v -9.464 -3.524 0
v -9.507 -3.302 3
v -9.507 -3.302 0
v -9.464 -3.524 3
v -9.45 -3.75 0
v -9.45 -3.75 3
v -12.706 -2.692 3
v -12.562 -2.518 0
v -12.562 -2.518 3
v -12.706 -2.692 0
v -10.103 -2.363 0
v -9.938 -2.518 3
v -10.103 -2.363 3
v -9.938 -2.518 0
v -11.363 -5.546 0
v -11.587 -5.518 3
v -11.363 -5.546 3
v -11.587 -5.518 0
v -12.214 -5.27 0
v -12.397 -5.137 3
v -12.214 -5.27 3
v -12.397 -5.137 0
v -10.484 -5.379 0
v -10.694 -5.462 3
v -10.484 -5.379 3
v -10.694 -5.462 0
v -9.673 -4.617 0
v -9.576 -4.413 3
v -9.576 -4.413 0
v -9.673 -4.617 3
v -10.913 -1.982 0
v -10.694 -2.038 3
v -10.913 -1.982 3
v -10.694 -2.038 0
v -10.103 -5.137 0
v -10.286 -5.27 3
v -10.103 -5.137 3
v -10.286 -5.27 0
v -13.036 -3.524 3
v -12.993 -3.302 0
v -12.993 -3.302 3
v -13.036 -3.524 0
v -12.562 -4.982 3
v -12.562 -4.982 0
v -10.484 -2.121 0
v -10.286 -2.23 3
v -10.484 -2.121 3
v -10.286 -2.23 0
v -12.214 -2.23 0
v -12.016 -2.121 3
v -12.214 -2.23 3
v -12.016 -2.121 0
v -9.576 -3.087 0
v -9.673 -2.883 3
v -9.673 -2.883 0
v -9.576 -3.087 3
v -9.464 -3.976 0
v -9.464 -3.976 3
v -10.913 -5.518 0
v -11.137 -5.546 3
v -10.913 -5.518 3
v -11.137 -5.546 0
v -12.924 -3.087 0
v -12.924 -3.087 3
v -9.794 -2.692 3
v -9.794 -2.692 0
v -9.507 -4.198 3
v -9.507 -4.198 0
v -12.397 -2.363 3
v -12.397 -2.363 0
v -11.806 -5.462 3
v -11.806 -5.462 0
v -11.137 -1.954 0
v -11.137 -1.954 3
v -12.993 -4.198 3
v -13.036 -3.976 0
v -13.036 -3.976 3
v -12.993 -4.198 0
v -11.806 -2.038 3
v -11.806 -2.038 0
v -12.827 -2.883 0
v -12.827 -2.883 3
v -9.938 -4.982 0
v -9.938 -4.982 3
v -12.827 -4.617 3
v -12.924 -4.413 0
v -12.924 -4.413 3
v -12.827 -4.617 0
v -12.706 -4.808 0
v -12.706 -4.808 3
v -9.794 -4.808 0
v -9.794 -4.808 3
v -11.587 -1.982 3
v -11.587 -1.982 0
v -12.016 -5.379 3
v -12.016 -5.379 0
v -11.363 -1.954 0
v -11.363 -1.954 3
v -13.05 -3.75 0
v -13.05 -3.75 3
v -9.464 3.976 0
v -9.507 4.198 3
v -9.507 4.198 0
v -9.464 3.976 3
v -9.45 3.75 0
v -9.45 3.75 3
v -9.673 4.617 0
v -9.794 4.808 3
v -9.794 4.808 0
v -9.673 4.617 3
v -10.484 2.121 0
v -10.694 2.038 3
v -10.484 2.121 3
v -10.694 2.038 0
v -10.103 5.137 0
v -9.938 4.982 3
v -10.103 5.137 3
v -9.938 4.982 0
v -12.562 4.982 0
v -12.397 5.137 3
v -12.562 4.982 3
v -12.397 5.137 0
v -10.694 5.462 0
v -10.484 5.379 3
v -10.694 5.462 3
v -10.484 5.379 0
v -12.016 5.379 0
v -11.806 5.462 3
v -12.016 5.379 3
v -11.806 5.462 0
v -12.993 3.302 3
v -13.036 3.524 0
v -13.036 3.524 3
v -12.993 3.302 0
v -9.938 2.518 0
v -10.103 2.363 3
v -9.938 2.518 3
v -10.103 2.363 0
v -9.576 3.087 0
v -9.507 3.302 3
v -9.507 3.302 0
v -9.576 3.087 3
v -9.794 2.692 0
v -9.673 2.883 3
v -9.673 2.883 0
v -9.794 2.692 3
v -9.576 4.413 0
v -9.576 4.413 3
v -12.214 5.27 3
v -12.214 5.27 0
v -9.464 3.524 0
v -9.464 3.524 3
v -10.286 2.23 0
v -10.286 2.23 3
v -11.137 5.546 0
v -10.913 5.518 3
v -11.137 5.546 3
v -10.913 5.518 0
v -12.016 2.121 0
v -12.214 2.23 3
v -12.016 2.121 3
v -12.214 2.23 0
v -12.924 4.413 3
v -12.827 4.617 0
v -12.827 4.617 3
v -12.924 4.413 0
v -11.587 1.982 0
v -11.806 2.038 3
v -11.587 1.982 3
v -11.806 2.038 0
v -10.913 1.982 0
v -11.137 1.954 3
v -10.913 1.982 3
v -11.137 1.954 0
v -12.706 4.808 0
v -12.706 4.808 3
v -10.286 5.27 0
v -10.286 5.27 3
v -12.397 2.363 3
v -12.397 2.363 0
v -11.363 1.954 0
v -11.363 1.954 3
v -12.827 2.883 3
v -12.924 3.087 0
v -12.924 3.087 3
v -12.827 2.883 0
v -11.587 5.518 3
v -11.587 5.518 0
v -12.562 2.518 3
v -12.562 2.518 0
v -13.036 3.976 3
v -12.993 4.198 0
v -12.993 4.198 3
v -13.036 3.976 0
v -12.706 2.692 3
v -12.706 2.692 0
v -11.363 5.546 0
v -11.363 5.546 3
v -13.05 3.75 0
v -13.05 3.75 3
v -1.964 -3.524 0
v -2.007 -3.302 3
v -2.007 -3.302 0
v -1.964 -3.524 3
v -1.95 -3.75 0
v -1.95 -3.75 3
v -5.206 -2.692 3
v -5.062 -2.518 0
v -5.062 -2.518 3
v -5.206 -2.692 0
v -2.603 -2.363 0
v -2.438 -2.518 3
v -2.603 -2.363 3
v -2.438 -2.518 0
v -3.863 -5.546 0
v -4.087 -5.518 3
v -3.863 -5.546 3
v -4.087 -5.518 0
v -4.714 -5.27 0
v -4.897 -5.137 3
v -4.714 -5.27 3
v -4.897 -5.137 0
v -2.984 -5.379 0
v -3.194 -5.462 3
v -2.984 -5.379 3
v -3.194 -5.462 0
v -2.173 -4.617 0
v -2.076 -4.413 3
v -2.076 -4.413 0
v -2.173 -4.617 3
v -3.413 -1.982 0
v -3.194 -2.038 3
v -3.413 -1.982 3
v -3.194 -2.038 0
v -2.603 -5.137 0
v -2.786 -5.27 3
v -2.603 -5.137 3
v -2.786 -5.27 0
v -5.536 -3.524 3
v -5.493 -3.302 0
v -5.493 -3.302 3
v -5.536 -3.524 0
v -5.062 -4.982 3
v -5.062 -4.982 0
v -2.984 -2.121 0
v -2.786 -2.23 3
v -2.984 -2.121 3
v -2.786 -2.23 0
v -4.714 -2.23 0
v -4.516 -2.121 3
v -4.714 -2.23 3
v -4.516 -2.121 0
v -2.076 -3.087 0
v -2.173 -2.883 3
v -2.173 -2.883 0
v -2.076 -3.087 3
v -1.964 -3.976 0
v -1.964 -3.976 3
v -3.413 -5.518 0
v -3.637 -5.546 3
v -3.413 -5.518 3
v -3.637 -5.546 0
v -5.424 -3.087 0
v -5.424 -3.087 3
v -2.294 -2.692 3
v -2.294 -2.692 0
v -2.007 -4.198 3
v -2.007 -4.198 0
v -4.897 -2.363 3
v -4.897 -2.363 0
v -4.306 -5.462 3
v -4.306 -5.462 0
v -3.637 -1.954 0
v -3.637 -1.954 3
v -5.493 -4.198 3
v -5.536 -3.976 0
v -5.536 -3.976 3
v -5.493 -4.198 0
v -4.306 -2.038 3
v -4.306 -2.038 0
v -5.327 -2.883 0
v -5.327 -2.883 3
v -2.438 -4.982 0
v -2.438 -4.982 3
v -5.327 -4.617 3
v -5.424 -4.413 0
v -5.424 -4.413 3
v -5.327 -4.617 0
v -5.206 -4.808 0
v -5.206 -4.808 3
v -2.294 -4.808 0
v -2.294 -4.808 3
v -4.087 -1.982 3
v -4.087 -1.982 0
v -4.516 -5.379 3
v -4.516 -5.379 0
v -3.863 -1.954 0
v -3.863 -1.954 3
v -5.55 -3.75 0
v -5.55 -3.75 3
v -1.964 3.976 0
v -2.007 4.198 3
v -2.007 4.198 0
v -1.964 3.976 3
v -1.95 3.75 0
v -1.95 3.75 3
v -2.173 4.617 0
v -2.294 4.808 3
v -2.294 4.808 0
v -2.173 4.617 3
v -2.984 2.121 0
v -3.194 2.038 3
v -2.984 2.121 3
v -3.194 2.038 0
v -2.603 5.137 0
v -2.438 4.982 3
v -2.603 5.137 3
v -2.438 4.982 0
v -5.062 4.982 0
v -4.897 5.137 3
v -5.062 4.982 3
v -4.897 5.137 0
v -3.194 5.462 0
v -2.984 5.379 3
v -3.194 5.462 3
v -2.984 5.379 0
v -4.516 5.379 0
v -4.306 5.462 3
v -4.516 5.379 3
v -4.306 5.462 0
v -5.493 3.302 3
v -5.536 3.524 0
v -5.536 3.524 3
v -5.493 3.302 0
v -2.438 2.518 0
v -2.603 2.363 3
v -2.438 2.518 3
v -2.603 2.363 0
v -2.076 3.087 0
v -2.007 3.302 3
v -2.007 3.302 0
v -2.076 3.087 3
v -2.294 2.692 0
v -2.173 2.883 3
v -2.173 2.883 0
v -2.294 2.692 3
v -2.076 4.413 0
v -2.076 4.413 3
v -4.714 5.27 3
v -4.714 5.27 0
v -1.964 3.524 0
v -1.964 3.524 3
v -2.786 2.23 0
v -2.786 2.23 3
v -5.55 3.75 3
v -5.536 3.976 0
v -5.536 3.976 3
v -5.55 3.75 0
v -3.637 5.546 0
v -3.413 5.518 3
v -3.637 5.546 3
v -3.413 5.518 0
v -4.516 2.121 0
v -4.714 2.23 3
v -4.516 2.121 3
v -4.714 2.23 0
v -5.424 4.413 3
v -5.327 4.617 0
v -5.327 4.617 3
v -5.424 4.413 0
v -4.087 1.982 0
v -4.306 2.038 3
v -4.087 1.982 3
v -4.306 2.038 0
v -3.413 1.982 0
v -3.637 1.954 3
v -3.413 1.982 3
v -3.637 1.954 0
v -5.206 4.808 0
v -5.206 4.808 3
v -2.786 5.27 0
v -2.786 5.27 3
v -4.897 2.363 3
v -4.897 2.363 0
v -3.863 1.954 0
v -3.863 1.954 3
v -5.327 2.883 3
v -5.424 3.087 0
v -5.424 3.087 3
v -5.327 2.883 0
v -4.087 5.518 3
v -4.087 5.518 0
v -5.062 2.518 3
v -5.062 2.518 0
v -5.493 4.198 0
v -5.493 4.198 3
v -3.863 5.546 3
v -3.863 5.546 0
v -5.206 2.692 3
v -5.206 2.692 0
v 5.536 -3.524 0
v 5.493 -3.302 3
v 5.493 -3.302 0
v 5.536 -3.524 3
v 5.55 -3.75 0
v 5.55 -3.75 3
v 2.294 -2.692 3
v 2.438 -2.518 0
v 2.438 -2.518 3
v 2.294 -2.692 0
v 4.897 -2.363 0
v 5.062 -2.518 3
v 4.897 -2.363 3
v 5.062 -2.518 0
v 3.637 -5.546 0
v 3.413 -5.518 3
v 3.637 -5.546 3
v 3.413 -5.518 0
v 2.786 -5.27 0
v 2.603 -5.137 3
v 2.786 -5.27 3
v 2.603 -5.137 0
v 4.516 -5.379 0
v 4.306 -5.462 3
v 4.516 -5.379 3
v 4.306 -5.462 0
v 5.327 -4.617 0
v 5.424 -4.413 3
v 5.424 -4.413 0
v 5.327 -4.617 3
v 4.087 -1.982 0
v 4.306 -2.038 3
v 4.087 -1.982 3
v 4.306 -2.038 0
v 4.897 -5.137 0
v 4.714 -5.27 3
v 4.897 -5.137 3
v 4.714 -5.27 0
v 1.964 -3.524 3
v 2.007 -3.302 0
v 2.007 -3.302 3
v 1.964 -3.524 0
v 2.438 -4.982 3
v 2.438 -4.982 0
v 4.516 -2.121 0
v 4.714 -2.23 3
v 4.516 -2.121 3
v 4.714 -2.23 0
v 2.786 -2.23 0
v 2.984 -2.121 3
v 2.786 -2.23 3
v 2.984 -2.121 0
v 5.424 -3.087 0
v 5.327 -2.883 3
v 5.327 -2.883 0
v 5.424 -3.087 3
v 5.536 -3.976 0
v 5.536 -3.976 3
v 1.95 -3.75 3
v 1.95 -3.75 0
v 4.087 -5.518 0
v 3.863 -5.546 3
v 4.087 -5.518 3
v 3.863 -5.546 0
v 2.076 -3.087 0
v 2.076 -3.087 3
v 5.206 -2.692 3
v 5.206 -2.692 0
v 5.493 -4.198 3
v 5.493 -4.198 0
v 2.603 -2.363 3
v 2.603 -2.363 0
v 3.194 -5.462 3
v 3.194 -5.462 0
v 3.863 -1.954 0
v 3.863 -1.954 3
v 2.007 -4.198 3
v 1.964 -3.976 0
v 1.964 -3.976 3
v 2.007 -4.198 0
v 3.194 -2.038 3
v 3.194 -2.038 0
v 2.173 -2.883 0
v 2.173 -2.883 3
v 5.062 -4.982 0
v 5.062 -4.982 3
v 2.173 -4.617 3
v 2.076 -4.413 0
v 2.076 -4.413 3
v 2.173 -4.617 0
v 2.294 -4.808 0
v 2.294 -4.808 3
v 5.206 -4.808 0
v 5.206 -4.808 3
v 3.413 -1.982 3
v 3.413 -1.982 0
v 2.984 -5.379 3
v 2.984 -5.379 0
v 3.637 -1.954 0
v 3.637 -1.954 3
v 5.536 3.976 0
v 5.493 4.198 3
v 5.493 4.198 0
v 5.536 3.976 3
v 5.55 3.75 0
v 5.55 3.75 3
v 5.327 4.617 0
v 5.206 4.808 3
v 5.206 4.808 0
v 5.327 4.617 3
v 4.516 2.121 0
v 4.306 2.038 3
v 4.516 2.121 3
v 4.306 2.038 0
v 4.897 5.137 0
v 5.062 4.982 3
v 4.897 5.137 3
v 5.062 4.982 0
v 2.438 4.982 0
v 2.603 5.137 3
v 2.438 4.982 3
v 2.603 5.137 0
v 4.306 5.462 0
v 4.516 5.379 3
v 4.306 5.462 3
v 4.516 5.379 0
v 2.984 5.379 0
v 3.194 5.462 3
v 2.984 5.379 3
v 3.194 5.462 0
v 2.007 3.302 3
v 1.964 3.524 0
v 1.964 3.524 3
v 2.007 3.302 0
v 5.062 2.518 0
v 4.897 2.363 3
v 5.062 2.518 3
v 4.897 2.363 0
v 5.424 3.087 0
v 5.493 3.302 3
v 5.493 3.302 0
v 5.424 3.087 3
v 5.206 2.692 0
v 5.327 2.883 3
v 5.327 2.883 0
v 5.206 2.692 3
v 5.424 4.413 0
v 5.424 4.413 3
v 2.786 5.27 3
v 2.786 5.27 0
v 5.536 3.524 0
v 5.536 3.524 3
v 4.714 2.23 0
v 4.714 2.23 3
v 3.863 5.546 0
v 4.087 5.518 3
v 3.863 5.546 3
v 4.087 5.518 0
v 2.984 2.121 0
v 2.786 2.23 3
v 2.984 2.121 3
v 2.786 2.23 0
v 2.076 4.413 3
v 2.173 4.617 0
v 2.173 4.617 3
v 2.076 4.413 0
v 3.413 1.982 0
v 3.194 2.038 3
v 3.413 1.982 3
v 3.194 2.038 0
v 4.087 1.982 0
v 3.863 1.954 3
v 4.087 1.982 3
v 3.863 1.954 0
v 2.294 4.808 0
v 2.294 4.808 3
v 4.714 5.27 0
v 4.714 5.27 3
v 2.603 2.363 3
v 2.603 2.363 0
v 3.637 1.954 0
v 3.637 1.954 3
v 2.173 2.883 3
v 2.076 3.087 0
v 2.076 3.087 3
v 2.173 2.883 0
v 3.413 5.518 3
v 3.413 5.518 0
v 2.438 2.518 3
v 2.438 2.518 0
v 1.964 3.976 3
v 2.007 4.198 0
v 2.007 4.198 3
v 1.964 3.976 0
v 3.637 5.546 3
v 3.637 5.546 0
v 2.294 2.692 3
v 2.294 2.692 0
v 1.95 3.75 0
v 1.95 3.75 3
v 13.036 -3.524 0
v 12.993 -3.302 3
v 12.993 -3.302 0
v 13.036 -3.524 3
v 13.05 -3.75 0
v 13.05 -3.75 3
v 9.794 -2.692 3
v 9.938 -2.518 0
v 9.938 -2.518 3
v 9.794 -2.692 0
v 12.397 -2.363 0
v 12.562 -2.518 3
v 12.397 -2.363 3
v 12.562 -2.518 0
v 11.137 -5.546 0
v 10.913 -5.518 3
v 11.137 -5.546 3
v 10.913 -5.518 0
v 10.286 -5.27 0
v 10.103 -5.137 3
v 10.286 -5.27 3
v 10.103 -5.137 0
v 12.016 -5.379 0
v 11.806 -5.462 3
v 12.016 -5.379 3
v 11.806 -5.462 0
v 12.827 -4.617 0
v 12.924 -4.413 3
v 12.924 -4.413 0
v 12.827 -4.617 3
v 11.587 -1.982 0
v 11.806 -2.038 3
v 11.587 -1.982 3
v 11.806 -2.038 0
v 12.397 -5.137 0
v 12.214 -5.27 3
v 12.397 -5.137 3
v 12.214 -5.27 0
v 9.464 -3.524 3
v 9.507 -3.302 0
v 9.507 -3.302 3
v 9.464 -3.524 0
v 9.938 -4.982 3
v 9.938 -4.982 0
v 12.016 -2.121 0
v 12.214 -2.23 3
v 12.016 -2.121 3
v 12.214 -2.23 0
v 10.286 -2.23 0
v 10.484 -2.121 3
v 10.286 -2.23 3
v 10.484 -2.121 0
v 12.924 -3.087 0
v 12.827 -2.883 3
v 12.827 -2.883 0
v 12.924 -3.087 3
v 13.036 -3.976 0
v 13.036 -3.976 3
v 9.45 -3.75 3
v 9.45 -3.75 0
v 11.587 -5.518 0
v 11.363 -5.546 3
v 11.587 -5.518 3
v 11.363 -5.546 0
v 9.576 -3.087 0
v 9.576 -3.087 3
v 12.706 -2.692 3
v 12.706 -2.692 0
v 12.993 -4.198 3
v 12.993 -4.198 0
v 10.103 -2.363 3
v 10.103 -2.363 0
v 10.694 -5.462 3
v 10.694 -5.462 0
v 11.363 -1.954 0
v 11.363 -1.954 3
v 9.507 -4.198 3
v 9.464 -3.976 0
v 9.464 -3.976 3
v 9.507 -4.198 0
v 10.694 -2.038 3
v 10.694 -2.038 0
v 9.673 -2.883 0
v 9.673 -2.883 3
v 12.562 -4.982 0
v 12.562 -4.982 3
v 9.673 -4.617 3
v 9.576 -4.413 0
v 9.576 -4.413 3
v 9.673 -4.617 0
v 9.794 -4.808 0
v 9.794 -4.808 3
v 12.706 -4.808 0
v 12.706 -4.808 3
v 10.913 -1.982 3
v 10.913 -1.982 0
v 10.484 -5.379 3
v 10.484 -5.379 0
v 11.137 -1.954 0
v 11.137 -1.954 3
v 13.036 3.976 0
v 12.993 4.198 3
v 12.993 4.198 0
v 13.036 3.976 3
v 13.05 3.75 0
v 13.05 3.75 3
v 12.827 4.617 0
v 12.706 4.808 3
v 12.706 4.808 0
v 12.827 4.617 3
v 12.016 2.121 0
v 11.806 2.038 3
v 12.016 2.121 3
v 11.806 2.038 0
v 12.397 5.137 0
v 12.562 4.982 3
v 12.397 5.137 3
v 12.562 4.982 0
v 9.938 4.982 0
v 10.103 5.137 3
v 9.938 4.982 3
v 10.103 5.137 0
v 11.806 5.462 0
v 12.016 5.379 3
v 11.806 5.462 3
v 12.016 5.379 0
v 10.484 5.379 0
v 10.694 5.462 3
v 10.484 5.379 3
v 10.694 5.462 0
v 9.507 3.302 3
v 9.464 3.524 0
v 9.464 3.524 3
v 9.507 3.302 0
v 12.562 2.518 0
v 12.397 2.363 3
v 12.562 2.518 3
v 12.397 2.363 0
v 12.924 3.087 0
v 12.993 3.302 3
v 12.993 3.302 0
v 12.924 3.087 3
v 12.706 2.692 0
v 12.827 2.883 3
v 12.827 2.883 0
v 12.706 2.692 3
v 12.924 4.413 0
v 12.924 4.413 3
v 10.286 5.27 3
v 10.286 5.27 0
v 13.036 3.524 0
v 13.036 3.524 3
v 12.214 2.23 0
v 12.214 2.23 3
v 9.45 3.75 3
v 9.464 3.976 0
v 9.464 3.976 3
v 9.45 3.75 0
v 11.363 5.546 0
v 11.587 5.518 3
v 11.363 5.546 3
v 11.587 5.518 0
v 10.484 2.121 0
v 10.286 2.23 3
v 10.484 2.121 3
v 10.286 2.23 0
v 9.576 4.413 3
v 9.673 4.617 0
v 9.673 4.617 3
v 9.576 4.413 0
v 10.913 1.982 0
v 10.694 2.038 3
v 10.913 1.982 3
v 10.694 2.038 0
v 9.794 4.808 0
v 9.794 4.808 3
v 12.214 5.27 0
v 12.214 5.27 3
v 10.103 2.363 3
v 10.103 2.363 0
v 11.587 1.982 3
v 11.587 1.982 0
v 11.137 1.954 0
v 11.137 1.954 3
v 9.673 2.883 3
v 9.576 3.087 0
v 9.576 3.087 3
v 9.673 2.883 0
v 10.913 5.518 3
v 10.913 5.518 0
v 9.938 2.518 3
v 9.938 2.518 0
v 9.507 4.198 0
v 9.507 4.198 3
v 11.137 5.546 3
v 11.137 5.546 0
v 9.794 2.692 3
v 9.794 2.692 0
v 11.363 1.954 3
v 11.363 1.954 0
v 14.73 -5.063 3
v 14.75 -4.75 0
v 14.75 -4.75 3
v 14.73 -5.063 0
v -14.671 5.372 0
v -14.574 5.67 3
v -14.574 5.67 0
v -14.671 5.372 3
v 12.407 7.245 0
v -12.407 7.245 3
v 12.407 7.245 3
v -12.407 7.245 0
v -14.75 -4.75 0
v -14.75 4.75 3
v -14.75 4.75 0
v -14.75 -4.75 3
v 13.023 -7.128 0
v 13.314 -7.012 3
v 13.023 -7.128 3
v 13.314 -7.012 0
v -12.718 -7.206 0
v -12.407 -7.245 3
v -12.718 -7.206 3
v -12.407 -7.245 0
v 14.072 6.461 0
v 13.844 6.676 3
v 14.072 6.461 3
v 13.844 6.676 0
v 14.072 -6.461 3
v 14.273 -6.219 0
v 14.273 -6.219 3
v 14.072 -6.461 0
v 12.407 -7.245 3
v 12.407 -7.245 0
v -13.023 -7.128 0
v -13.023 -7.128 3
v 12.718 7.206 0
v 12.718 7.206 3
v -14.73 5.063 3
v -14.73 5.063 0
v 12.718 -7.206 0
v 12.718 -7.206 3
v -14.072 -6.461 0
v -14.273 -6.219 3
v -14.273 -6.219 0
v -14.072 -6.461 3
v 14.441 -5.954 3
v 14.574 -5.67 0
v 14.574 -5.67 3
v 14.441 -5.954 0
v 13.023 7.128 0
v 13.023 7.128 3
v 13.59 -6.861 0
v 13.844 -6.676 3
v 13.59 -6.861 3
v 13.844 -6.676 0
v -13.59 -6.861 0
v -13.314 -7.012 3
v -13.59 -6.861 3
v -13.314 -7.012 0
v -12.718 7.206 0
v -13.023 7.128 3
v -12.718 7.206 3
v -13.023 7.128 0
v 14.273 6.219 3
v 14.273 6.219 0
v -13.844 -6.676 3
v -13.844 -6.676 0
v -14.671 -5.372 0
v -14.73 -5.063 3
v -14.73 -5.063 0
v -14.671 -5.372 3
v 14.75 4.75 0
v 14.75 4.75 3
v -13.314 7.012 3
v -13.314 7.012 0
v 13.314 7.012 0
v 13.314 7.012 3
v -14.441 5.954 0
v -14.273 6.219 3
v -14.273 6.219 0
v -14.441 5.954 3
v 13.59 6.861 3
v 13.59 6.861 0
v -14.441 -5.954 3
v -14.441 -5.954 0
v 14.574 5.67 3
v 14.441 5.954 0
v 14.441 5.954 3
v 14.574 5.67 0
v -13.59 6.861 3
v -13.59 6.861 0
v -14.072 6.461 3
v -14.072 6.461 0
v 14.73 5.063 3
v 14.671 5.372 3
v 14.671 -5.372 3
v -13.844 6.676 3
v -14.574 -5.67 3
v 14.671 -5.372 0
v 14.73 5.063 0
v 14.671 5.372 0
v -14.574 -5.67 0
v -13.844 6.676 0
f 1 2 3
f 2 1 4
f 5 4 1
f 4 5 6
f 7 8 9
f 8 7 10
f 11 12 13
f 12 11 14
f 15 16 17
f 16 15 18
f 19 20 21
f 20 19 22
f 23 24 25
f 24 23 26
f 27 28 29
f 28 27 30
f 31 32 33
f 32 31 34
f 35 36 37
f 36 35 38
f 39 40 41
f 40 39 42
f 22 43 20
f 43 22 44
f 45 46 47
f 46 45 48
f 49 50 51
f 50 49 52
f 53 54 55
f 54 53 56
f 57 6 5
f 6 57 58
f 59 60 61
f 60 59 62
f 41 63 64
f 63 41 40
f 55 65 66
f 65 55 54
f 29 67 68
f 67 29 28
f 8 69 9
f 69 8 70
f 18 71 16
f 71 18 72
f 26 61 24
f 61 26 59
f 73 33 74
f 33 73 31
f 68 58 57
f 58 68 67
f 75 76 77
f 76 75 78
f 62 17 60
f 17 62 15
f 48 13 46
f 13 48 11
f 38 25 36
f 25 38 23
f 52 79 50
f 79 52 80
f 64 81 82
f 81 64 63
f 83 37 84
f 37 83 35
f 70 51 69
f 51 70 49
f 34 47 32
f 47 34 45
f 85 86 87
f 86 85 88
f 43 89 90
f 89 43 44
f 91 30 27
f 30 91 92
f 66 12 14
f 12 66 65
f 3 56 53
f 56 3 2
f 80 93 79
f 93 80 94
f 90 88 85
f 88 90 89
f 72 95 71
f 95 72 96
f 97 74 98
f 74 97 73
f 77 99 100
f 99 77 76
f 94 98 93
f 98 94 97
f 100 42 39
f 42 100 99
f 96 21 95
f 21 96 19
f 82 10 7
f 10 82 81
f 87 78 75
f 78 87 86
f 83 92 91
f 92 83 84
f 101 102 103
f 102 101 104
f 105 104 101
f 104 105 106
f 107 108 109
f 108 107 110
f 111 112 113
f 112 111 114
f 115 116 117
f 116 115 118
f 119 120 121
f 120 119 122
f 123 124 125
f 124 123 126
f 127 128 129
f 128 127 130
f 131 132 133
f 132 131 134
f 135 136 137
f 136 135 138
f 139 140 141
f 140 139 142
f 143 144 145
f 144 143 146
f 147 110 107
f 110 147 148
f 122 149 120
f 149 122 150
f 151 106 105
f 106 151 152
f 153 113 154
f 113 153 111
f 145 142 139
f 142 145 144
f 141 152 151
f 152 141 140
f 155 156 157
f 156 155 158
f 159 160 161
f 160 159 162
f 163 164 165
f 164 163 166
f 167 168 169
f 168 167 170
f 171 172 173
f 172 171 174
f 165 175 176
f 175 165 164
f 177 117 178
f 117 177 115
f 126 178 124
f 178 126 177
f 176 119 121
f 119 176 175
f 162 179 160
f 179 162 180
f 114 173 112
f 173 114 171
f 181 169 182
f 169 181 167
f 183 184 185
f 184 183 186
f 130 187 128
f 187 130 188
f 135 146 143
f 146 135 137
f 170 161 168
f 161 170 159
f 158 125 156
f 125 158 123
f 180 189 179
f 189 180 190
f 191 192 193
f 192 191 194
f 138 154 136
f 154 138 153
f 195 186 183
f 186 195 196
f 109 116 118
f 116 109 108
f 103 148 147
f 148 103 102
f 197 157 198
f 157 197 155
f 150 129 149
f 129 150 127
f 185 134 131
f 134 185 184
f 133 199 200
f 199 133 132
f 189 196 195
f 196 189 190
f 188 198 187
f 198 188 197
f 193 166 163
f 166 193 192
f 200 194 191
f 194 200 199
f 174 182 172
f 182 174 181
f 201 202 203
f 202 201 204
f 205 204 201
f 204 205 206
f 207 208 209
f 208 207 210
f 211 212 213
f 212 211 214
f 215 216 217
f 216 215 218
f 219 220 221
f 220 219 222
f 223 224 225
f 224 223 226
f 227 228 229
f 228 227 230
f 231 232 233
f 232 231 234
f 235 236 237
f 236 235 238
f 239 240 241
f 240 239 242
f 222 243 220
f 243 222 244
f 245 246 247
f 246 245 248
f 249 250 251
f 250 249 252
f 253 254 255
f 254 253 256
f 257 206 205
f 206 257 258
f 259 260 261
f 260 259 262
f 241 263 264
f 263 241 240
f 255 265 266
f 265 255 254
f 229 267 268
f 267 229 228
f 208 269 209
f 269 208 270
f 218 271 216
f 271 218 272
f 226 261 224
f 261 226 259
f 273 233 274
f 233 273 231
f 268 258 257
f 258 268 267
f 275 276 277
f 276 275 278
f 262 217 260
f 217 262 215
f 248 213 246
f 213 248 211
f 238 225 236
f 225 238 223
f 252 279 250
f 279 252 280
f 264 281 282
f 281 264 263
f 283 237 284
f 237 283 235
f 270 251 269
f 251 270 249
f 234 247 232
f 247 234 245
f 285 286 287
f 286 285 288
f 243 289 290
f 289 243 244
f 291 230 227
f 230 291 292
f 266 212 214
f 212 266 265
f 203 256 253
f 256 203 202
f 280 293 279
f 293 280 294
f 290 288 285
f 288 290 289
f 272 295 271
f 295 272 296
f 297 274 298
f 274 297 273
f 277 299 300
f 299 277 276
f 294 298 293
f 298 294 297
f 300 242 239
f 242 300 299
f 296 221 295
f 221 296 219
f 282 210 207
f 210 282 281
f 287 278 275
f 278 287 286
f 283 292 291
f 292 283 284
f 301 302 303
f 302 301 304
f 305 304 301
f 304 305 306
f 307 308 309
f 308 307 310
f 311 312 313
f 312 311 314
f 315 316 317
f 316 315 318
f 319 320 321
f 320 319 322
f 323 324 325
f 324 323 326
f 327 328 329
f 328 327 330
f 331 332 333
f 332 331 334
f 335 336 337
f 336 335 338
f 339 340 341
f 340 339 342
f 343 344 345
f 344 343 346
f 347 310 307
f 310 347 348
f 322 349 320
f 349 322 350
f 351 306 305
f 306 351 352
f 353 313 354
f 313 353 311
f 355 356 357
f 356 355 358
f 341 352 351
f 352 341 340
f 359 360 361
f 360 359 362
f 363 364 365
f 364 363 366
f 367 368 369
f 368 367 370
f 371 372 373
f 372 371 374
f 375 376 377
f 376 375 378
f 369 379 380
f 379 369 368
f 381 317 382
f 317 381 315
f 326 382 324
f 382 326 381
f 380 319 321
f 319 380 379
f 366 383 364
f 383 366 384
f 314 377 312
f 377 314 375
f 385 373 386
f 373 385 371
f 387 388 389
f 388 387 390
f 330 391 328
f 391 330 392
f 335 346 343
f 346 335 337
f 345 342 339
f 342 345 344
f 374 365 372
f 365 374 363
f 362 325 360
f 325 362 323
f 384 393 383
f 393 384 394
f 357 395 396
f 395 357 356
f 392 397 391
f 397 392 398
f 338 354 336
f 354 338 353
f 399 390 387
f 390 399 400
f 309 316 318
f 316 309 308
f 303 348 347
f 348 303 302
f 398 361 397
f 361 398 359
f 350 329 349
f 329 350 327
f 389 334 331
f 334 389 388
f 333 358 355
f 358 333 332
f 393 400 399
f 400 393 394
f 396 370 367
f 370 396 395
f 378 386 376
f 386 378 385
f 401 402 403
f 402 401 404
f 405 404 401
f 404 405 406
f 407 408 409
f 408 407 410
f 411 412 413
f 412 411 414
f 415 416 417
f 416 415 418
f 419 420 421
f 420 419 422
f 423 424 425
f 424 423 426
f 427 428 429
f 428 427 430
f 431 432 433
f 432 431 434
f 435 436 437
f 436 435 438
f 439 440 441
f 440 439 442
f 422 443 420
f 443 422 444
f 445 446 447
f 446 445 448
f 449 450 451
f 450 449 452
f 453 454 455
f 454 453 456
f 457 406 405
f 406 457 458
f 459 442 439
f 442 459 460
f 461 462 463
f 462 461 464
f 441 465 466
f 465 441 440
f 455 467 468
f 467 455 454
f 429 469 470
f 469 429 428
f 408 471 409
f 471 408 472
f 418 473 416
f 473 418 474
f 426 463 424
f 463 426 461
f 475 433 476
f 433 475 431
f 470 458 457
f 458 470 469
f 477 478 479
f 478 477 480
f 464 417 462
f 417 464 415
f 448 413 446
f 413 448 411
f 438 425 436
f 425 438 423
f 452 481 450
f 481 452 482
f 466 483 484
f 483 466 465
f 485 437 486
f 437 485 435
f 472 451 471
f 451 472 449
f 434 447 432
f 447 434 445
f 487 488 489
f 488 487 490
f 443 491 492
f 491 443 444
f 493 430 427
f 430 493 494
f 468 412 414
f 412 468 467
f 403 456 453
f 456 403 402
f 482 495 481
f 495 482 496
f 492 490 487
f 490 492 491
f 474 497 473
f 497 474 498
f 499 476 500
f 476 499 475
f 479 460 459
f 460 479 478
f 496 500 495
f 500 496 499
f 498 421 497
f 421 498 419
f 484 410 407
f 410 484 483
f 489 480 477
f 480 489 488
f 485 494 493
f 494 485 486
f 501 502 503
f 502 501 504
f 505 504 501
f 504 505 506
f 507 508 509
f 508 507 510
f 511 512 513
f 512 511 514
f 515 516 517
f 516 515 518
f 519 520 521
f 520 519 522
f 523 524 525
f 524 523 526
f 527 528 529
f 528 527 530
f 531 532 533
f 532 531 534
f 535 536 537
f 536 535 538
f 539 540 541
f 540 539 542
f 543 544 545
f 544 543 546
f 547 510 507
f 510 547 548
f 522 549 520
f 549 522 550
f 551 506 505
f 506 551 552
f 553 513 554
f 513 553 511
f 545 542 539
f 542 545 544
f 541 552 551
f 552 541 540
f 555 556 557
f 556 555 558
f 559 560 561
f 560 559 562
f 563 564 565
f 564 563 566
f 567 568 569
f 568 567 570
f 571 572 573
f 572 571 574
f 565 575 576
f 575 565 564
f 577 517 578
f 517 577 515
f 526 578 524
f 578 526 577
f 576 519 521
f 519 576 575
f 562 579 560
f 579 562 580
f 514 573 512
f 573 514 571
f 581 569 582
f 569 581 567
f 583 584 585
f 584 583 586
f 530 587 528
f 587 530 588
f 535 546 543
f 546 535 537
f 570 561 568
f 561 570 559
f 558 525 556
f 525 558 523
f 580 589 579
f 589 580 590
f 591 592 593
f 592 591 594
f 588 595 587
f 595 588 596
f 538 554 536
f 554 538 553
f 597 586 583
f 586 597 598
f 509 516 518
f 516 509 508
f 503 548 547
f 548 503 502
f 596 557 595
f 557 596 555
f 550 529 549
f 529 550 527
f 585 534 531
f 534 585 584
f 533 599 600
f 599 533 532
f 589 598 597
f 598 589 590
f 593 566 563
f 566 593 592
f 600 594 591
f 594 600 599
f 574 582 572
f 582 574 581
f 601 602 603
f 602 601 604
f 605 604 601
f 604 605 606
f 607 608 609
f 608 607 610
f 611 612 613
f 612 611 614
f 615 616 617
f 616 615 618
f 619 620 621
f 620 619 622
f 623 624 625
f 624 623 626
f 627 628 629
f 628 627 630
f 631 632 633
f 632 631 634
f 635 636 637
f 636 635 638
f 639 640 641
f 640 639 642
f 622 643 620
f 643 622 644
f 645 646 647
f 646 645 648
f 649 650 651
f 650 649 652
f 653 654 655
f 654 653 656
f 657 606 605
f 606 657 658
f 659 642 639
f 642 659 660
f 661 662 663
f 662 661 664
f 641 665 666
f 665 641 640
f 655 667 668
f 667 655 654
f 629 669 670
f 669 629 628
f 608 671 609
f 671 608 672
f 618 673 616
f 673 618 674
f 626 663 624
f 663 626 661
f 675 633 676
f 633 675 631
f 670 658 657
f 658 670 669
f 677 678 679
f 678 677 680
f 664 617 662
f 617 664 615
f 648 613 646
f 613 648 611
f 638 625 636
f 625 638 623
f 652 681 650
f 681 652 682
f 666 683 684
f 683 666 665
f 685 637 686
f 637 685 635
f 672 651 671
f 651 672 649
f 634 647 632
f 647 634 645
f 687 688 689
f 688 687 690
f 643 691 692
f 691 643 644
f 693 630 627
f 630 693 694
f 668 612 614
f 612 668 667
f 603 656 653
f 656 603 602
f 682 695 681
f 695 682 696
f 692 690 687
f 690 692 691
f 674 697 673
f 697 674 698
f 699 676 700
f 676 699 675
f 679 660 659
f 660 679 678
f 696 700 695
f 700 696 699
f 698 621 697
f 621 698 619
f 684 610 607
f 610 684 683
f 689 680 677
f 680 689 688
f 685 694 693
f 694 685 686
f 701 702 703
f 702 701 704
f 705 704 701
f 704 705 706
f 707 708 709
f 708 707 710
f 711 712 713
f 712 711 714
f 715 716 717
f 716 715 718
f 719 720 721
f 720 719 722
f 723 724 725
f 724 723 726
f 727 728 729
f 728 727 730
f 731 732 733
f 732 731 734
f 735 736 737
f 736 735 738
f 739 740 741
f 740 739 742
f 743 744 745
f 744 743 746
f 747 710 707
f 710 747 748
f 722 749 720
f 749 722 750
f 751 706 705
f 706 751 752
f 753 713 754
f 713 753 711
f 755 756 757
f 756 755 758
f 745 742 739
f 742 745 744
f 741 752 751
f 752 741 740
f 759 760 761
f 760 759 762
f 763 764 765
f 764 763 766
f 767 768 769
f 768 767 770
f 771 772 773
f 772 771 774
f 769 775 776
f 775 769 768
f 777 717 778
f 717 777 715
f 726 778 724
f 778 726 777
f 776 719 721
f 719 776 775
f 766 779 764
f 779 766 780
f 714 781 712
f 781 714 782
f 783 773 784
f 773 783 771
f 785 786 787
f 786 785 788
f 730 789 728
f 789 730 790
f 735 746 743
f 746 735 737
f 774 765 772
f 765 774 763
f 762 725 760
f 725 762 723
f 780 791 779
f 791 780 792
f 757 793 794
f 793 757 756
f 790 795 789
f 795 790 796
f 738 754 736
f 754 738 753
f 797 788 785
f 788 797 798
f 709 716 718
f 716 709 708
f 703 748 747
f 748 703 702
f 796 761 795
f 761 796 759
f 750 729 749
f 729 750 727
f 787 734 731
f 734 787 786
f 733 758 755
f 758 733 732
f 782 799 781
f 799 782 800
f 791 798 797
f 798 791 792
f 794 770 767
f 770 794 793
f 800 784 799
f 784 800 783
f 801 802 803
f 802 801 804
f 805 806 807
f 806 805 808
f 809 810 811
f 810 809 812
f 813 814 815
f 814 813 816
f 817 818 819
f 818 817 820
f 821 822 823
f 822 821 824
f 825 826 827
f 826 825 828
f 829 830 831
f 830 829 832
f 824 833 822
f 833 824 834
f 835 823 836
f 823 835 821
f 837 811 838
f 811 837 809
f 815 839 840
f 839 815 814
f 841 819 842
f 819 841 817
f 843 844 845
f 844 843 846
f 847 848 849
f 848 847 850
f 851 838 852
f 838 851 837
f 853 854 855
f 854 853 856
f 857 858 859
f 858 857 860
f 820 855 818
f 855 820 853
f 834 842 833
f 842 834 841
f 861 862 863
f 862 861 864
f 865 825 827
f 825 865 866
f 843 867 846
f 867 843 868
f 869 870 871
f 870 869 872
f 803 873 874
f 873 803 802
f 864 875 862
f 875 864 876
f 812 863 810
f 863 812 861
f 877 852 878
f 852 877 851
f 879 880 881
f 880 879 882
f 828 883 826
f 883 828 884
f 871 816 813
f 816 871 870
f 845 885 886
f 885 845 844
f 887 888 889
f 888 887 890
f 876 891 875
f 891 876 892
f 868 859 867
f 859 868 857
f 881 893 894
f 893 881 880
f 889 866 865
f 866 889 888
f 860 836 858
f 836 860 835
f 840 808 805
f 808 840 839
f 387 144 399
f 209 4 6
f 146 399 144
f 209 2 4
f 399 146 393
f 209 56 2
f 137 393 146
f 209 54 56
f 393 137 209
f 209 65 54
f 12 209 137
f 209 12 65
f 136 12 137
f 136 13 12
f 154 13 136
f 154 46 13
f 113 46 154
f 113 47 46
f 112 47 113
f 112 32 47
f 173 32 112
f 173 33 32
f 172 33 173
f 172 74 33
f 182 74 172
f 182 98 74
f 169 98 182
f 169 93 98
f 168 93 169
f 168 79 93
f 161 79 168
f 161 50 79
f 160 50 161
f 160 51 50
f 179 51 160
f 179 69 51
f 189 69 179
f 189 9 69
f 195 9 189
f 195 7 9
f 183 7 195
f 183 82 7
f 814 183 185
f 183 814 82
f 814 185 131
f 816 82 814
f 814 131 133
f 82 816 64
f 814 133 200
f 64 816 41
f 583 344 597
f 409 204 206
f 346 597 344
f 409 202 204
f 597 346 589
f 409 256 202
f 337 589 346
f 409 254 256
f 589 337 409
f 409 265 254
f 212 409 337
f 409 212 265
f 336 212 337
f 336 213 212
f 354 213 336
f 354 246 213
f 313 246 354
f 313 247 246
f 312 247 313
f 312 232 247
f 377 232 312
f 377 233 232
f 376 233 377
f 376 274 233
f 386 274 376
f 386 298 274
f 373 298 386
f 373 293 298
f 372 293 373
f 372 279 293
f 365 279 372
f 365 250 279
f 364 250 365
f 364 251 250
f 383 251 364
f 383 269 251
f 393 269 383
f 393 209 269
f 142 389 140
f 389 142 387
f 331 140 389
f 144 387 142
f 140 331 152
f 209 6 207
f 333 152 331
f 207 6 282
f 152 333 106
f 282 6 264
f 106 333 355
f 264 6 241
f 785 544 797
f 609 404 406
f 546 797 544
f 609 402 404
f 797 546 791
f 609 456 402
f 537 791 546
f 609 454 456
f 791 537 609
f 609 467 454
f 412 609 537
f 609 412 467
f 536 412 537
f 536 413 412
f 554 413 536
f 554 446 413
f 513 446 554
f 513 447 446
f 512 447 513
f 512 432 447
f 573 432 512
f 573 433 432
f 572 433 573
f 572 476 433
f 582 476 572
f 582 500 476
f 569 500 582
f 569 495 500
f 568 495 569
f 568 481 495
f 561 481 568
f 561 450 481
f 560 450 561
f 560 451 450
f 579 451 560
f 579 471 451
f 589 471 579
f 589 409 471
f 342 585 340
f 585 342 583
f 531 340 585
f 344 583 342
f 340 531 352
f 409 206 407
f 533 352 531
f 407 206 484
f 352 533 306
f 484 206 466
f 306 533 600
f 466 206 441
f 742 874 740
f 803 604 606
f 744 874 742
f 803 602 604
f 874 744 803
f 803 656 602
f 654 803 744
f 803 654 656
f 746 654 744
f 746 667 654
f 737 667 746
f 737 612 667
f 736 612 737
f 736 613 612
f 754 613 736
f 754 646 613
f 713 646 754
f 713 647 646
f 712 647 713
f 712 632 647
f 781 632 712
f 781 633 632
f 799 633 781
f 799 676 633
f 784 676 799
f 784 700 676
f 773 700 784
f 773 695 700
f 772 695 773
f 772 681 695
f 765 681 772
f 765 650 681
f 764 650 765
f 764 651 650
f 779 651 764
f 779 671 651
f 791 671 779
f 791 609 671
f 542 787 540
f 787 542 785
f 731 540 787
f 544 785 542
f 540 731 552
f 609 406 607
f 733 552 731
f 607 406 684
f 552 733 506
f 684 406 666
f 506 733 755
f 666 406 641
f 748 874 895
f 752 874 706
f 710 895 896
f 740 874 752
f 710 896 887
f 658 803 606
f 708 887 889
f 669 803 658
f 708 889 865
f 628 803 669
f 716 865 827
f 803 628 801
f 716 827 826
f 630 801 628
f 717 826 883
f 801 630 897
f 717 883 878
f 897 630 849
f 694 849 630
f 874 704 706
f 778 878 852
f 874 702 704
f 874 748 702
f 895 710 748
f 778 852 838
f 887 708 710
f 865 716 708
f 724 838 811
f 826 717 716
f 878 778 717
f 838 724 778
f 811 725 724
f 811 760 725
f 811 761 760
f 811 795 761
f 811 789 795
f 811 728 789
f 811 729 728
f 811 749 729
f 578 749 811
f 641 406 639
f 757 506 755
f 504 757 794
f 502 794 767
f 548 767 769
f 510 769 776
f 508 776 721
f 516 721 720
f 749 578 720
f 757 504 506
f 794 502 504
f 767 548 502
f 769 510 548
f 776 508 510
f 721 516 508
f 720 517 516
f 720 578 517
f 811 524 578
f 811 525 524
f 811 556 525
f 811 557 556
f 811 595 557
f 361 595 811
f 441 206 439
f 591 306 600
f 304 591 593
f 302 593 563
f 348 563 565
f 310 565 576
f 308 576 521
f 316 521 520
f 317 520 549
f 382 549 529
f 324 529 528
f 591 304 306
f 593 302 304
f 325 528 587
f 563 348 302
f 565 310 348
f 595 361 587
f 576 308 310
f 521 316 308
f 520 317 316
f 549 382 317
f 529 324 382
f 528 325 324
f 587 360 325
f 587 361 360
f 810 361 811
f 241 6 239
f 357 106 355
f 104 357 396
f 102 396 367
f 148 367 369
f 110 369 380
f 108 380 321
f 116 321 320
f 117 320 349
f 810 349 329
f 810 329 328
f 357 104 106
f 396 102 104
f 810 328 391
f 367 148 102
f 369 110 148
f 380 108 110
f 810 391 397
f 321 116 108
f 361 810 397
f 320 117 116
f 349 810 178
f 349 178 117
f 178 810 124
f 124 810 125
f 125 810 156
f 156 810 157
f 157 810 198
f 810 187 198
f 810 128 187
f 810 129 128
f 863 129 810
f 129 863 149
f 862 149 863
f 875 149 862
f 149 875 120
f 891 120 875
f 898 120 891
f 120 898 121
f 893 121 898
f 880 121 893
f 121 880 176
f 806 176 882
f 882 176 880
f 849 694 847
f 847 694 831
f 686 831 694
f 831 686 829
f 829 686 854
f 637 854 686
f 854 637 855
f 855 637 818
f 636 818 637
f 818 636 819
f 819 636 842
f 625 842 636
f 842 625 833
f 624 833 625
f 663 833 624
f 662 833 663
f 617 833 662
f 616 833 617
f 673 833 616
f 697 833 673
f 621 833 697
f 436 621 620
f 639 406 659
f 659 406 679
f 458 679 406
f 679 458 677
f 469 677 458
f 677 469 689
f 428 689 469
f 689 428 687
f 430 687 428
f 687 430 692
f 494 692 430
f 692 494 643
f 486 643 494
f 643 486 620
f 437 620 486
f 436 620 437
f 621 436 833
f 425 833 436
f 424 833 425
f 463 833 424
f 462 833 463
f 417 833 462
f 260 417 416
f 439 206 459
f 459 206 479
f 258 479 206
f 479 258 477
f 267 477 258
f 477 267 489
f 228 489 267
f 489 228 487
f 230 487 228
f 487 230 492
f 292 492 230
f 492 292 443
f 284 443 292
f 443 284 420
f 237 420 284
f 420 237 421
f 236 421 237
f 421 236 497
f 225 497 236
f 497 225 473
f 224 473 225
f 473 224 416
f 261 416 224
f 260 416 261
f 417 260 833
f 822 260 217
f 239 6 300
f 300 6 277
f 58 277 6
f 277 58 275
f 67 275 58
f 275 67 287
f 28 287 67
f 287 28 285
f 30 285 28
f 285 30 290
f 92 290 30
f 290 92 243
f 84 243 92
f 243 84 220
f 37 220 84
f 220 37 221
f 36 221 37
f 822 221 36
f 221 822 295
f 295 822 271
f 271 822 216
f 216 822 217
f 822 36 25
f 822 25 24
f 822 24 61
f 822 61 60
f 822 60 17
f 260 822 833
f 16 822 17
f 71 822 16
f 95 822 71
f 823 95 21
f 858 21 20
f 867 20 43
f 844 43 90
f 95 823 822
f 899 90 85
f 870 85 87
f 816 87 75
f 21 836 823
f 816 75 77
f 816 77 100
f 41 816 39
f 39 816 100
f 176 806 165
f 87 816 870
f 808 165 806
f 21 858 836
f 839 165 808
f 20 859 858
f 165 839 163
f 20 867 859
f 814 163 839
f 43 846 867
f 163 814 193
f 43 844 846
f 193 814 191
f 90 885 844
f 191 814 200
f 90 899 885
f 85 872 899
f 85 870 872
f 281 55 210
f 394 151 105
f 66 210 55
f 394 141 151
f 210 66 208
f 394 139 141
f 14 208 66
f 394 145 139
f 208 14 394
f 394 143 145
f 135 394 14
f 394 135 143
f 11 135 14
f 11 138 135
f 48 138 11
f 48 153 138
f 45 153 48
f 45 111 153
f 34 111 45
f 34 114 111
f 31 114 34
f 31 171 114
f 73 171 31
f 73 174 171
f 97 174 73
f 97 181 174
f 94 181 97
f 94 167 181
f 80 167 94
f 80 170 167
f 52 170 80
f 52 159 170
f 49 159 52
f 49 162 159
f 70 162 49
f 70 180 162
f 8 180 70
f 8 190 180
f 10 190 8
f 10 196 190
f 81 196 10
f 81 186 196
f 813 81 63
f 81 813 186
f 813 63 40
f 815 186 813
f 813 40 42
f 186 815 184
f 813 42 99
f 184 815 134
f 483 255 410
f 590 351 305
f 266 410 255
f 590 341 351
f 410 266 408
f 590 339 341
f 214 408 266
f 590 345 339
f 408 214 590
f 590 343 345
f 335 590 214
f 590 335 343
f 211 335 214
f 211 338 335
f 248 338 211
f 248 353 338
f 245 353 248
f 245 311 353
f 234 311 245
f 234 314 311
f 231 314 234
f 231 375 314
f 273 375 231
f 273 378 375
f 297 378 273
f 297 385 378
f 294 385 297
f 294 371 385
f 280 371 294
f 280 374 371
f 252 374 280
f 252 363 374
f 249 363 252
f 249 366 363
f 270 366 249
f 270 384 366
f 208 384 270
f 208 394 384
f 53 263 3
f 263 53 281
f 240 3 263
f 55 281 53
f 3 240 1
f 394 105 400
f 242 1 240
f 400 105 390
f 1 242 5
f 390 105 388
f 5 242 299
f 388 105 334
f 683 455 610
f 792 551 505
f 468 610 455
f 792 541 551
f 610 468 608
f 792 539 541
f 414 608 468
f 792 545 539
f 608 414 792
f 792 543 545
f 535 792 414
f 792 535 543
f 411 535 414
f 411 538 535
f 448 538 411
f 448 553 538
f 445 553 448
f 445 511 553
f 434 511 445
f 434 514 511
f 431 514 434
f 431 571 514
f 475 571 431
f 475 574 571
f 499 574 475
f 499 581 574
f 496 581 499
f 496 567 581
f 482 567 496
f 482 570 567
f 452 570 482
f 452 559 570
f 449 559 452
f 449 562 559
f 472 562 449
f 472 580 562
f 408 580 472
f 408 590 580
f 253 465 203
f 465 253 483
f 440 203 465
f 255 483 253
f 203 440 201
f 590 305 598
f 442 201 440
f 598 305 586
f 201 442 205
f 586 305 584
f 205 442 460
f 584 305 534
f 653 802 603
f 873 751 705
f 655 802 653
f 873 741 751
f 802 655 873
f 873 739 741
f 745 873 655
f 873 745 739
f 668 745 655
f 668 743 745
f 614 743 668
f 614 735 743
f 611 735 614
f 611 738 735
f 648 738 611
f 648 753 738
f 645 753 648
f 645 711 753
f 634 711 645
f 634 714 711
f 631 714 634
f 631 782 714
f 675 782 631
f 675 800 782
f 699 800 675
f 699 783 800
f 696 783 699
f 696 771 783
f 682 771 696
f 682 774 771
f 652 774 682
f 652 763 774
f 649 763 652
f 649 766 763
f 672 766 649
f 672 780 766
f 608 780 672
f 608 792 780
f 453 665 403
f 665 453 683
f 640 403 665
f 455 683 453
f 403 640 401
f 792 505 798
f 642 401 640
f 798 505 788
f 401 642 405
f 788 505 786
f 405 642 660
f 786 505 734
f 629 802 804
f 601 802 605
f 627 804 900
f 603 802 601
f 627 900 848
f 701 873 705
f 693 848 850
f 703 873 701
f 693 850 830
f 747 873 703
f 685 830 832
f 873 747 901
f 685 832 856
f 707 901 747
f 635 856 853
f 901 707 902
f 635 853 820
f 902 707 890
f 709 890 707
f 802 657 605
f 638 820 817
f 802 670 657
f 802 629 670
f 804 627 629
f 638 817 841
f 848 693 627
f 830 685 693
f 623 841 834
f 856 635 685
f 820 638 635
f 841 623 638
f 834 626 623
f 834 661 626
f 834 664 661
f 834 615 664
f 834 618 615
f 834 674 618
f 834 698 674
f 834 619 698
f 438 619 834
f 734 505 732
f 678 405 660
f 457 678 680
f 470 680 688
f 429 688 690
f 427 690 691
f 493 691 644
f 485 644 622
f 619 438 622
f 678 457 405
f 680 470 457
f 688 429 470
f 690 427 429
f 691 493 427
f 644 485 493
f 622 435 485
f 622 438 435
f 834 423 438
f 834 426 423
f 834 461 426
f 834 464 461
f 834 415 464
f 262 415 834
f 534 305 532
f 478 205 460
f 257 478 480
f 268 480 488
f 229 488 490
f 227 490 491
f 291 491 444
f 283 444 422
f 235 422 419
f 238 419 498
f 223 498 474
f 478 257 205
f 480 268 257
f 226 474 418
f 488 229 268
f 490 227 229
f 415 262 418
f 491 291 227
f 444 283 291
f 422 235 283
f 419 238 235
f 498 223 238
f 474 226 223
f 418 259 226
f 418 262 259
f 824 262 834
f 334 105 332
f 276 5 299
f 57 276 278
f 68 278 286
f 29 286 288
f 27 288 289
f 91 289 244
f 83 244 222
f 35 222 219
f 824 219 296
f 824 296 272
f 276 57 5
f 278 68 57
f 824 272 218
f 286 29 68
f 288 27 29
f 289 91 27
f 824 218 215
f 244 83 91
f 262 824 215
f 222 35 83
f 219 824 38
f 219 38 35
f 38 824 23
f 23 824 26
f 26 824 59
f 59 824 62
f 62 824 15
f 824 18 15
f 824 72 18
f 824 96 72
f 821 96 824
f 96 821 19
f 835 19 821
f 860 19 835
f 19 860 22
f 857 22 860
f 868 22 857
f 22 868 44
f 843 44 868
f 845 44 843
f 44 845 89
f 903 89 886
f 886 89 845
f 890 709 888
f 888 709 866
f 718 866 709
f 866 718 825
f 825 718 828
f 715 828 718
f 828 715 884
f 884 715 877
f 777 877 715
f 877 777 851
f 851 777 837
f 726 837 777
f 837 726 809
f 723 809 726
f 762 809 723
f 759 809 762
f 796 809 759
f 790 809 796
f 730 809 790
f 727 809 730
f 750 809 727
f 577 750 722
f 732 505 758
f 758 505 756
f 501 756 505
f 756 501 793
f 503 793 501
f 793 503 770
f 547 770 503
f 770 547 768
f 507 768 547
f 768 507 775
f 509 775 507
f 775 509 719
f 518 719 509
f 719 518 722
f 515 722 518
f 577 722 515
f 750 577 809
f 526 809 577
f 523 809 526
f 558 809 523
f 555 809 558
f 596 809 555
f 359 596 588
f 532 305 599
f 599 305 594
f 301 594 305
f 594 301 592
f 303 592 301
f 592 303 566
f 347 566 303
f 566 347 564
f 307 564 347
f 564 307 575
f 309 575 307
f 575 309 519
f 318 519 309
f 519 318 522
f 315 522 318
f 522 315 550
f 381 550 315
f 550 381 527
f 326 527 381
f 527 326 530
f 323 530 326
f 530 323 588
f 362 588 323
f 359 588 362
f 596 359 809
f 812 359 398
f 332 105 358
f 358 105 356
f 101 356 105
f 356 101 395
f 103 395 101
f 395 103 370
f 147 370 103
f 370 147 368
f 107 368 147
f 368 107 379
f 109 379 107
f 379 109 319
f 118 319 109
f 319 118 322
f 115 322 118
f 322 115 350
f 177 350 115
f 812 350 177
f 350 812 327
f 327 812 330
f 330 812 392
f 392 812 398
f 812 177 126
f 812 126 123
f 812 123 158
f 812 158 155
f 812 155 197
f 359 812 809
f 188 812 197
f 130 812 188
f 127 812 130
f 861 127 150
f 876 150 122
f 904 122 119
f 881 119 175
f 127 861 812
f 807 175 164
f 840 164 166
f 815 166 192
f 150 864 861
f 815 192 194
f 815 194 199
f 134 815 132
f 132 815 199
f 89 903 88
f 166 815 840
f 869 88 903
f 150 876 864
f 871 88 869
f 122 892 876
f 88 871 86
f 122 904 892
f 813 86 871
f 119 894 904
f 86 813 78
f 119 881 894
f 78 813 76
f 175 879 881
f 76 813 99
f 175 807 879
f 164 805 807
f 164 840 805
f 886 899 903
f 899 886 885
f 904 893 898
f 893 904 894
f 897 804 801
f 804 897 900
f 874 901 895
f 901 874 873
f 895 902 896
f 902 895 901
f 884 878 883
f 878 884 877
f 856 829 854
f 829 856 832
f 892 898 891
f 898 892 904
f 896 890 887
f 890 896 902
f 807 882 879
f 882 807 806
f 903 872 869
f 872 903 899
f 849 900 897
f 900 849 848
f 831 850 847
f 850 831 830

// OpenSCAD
$fn = 50;


difference() {
	union() {
		translate(v = [0, 0, 0]) {
			rotate(a = [0, 0, 0]) {
				hull() {
					translate(v = [-12.2500000000, 4.7500000000, 0]) {
						rotate(a = [0, 0, 0]) {
							translate(v = [0, 0, 0]) {
								rotate(a = [0, 0, 0]) {
									cylinder(h = 3, r = 2.5000000000);
								}
							}
						}
					}
					translate(v = [12.2500000000, 4.7500000000, 0]) {
						rotate(a = [0, 0, 0]) {
							translate(v = [0, 0, 0]) {
								rotate(a = [0, 0, 0]) {
									cylinder(h = 3, r = 2.5000000000);
								}
							}
						}
					}
					translate(v = [-12.2500000000, -4.7500000000, 0]) {
						rotate(a = [0, 0, 0]) {
							translate(v = [0, 0, 0]) {
								rotate(a = [0, 0, 0]) {
									cylinder(h = 3, r = 2.5000000000);
								}
							}
						}
					}
					translate(v = [12.2500000000, -4.7500000000, 0]) {
						rotate(a = [0, 0, 0]) {
							translate(v = [0, 0, 0]) {
								rotate(a = [0, 0, 0]) {
									cylinder(h = 3, r = 2.5000000000);
								}
							}
						}
					}
				}
			}
		}
	}
	union() {
		translate(v = [-11.2500000000, -3.7500000000, 0]) {
			rotate(a = [0, 0, 0]) {
				translate(v = [0, 0, -50]) {
					rotate(a = [0, 0, 0]) {
						cylinder(h = 100, r = 1.8000000000);
					}
				}
			}
		}
		translate(v = [-11.2500000000, 3.7500000000, 0]) {
			rotate(a = [0, 0, 0]) {
				translate(v = [0, 0, -50]) {
					rotate(a = [0, 0, 0]) {
						cylinder(h = 100, r = 1.8000000000);
					}
				}
			}
		}
		translate(v = [-3.7500000000, -3.7500000000, 0]) {
			rotate(a = [0, 0, 0]) {
				translate(v = [0, 0, -50]) {
					rotate(a = [0, 0, 0]) {
						cylinder(h = 100, r = 1.8000000000);
					}
				}
			}
		}
		translate(v = [-3.7500000000, 3.7500000000, 0]) {
			rotate(a = [0, 0, 0]) {
				translate(v = [0, 0, -50]) {
					rotate(a = [0, 0, 0]) {
						cylinder(h = 100, r = 1.8000000000);
					}
				}
			}
		}
		translate(v = [3.7500000000, -3.7500000000, 0]) {
			rotate(a = [0, 0, 0]) {
				translate(v = [0, 0, -50]) {
					rotate(a = [0, 0, 0]) {
						cylinder(h = 100, r = 1.8000000000);
					}
				}
			}
		}
		translate(v = [3.7500000000, 3.7500000000, 0]) {
			rotate(a = [0, 0, 0]) {
				translate(v = [0, 0, -50]) {
					rotate(a = [0, 0, 0]) {
						cylinder(h = 100, r = 1.8000000000);
					}
				}
			}
		}
		translate(v = [11.2500000000, -3.7500000000, 0]) {
			rotate(a = [0, 0, 0]) {
				translate(v = [0, 0, -50]) {
					rotate(a = [0, 0, 0]) {
						cylinder(h = 100, r = 1.8000000000);
					}
				}
			}
		}
		translate(v = [11.2500000000, 3.7500000000, 0]) {
			rotate(a = [0, 0, 0]) {
				translate(v = [0, 0, -50]) {
					rotate(a = [0, 0, 0]) {
						cylinder(h = 100, r = 1.8000000000);
					}
				}
			}
		}
	}
}
